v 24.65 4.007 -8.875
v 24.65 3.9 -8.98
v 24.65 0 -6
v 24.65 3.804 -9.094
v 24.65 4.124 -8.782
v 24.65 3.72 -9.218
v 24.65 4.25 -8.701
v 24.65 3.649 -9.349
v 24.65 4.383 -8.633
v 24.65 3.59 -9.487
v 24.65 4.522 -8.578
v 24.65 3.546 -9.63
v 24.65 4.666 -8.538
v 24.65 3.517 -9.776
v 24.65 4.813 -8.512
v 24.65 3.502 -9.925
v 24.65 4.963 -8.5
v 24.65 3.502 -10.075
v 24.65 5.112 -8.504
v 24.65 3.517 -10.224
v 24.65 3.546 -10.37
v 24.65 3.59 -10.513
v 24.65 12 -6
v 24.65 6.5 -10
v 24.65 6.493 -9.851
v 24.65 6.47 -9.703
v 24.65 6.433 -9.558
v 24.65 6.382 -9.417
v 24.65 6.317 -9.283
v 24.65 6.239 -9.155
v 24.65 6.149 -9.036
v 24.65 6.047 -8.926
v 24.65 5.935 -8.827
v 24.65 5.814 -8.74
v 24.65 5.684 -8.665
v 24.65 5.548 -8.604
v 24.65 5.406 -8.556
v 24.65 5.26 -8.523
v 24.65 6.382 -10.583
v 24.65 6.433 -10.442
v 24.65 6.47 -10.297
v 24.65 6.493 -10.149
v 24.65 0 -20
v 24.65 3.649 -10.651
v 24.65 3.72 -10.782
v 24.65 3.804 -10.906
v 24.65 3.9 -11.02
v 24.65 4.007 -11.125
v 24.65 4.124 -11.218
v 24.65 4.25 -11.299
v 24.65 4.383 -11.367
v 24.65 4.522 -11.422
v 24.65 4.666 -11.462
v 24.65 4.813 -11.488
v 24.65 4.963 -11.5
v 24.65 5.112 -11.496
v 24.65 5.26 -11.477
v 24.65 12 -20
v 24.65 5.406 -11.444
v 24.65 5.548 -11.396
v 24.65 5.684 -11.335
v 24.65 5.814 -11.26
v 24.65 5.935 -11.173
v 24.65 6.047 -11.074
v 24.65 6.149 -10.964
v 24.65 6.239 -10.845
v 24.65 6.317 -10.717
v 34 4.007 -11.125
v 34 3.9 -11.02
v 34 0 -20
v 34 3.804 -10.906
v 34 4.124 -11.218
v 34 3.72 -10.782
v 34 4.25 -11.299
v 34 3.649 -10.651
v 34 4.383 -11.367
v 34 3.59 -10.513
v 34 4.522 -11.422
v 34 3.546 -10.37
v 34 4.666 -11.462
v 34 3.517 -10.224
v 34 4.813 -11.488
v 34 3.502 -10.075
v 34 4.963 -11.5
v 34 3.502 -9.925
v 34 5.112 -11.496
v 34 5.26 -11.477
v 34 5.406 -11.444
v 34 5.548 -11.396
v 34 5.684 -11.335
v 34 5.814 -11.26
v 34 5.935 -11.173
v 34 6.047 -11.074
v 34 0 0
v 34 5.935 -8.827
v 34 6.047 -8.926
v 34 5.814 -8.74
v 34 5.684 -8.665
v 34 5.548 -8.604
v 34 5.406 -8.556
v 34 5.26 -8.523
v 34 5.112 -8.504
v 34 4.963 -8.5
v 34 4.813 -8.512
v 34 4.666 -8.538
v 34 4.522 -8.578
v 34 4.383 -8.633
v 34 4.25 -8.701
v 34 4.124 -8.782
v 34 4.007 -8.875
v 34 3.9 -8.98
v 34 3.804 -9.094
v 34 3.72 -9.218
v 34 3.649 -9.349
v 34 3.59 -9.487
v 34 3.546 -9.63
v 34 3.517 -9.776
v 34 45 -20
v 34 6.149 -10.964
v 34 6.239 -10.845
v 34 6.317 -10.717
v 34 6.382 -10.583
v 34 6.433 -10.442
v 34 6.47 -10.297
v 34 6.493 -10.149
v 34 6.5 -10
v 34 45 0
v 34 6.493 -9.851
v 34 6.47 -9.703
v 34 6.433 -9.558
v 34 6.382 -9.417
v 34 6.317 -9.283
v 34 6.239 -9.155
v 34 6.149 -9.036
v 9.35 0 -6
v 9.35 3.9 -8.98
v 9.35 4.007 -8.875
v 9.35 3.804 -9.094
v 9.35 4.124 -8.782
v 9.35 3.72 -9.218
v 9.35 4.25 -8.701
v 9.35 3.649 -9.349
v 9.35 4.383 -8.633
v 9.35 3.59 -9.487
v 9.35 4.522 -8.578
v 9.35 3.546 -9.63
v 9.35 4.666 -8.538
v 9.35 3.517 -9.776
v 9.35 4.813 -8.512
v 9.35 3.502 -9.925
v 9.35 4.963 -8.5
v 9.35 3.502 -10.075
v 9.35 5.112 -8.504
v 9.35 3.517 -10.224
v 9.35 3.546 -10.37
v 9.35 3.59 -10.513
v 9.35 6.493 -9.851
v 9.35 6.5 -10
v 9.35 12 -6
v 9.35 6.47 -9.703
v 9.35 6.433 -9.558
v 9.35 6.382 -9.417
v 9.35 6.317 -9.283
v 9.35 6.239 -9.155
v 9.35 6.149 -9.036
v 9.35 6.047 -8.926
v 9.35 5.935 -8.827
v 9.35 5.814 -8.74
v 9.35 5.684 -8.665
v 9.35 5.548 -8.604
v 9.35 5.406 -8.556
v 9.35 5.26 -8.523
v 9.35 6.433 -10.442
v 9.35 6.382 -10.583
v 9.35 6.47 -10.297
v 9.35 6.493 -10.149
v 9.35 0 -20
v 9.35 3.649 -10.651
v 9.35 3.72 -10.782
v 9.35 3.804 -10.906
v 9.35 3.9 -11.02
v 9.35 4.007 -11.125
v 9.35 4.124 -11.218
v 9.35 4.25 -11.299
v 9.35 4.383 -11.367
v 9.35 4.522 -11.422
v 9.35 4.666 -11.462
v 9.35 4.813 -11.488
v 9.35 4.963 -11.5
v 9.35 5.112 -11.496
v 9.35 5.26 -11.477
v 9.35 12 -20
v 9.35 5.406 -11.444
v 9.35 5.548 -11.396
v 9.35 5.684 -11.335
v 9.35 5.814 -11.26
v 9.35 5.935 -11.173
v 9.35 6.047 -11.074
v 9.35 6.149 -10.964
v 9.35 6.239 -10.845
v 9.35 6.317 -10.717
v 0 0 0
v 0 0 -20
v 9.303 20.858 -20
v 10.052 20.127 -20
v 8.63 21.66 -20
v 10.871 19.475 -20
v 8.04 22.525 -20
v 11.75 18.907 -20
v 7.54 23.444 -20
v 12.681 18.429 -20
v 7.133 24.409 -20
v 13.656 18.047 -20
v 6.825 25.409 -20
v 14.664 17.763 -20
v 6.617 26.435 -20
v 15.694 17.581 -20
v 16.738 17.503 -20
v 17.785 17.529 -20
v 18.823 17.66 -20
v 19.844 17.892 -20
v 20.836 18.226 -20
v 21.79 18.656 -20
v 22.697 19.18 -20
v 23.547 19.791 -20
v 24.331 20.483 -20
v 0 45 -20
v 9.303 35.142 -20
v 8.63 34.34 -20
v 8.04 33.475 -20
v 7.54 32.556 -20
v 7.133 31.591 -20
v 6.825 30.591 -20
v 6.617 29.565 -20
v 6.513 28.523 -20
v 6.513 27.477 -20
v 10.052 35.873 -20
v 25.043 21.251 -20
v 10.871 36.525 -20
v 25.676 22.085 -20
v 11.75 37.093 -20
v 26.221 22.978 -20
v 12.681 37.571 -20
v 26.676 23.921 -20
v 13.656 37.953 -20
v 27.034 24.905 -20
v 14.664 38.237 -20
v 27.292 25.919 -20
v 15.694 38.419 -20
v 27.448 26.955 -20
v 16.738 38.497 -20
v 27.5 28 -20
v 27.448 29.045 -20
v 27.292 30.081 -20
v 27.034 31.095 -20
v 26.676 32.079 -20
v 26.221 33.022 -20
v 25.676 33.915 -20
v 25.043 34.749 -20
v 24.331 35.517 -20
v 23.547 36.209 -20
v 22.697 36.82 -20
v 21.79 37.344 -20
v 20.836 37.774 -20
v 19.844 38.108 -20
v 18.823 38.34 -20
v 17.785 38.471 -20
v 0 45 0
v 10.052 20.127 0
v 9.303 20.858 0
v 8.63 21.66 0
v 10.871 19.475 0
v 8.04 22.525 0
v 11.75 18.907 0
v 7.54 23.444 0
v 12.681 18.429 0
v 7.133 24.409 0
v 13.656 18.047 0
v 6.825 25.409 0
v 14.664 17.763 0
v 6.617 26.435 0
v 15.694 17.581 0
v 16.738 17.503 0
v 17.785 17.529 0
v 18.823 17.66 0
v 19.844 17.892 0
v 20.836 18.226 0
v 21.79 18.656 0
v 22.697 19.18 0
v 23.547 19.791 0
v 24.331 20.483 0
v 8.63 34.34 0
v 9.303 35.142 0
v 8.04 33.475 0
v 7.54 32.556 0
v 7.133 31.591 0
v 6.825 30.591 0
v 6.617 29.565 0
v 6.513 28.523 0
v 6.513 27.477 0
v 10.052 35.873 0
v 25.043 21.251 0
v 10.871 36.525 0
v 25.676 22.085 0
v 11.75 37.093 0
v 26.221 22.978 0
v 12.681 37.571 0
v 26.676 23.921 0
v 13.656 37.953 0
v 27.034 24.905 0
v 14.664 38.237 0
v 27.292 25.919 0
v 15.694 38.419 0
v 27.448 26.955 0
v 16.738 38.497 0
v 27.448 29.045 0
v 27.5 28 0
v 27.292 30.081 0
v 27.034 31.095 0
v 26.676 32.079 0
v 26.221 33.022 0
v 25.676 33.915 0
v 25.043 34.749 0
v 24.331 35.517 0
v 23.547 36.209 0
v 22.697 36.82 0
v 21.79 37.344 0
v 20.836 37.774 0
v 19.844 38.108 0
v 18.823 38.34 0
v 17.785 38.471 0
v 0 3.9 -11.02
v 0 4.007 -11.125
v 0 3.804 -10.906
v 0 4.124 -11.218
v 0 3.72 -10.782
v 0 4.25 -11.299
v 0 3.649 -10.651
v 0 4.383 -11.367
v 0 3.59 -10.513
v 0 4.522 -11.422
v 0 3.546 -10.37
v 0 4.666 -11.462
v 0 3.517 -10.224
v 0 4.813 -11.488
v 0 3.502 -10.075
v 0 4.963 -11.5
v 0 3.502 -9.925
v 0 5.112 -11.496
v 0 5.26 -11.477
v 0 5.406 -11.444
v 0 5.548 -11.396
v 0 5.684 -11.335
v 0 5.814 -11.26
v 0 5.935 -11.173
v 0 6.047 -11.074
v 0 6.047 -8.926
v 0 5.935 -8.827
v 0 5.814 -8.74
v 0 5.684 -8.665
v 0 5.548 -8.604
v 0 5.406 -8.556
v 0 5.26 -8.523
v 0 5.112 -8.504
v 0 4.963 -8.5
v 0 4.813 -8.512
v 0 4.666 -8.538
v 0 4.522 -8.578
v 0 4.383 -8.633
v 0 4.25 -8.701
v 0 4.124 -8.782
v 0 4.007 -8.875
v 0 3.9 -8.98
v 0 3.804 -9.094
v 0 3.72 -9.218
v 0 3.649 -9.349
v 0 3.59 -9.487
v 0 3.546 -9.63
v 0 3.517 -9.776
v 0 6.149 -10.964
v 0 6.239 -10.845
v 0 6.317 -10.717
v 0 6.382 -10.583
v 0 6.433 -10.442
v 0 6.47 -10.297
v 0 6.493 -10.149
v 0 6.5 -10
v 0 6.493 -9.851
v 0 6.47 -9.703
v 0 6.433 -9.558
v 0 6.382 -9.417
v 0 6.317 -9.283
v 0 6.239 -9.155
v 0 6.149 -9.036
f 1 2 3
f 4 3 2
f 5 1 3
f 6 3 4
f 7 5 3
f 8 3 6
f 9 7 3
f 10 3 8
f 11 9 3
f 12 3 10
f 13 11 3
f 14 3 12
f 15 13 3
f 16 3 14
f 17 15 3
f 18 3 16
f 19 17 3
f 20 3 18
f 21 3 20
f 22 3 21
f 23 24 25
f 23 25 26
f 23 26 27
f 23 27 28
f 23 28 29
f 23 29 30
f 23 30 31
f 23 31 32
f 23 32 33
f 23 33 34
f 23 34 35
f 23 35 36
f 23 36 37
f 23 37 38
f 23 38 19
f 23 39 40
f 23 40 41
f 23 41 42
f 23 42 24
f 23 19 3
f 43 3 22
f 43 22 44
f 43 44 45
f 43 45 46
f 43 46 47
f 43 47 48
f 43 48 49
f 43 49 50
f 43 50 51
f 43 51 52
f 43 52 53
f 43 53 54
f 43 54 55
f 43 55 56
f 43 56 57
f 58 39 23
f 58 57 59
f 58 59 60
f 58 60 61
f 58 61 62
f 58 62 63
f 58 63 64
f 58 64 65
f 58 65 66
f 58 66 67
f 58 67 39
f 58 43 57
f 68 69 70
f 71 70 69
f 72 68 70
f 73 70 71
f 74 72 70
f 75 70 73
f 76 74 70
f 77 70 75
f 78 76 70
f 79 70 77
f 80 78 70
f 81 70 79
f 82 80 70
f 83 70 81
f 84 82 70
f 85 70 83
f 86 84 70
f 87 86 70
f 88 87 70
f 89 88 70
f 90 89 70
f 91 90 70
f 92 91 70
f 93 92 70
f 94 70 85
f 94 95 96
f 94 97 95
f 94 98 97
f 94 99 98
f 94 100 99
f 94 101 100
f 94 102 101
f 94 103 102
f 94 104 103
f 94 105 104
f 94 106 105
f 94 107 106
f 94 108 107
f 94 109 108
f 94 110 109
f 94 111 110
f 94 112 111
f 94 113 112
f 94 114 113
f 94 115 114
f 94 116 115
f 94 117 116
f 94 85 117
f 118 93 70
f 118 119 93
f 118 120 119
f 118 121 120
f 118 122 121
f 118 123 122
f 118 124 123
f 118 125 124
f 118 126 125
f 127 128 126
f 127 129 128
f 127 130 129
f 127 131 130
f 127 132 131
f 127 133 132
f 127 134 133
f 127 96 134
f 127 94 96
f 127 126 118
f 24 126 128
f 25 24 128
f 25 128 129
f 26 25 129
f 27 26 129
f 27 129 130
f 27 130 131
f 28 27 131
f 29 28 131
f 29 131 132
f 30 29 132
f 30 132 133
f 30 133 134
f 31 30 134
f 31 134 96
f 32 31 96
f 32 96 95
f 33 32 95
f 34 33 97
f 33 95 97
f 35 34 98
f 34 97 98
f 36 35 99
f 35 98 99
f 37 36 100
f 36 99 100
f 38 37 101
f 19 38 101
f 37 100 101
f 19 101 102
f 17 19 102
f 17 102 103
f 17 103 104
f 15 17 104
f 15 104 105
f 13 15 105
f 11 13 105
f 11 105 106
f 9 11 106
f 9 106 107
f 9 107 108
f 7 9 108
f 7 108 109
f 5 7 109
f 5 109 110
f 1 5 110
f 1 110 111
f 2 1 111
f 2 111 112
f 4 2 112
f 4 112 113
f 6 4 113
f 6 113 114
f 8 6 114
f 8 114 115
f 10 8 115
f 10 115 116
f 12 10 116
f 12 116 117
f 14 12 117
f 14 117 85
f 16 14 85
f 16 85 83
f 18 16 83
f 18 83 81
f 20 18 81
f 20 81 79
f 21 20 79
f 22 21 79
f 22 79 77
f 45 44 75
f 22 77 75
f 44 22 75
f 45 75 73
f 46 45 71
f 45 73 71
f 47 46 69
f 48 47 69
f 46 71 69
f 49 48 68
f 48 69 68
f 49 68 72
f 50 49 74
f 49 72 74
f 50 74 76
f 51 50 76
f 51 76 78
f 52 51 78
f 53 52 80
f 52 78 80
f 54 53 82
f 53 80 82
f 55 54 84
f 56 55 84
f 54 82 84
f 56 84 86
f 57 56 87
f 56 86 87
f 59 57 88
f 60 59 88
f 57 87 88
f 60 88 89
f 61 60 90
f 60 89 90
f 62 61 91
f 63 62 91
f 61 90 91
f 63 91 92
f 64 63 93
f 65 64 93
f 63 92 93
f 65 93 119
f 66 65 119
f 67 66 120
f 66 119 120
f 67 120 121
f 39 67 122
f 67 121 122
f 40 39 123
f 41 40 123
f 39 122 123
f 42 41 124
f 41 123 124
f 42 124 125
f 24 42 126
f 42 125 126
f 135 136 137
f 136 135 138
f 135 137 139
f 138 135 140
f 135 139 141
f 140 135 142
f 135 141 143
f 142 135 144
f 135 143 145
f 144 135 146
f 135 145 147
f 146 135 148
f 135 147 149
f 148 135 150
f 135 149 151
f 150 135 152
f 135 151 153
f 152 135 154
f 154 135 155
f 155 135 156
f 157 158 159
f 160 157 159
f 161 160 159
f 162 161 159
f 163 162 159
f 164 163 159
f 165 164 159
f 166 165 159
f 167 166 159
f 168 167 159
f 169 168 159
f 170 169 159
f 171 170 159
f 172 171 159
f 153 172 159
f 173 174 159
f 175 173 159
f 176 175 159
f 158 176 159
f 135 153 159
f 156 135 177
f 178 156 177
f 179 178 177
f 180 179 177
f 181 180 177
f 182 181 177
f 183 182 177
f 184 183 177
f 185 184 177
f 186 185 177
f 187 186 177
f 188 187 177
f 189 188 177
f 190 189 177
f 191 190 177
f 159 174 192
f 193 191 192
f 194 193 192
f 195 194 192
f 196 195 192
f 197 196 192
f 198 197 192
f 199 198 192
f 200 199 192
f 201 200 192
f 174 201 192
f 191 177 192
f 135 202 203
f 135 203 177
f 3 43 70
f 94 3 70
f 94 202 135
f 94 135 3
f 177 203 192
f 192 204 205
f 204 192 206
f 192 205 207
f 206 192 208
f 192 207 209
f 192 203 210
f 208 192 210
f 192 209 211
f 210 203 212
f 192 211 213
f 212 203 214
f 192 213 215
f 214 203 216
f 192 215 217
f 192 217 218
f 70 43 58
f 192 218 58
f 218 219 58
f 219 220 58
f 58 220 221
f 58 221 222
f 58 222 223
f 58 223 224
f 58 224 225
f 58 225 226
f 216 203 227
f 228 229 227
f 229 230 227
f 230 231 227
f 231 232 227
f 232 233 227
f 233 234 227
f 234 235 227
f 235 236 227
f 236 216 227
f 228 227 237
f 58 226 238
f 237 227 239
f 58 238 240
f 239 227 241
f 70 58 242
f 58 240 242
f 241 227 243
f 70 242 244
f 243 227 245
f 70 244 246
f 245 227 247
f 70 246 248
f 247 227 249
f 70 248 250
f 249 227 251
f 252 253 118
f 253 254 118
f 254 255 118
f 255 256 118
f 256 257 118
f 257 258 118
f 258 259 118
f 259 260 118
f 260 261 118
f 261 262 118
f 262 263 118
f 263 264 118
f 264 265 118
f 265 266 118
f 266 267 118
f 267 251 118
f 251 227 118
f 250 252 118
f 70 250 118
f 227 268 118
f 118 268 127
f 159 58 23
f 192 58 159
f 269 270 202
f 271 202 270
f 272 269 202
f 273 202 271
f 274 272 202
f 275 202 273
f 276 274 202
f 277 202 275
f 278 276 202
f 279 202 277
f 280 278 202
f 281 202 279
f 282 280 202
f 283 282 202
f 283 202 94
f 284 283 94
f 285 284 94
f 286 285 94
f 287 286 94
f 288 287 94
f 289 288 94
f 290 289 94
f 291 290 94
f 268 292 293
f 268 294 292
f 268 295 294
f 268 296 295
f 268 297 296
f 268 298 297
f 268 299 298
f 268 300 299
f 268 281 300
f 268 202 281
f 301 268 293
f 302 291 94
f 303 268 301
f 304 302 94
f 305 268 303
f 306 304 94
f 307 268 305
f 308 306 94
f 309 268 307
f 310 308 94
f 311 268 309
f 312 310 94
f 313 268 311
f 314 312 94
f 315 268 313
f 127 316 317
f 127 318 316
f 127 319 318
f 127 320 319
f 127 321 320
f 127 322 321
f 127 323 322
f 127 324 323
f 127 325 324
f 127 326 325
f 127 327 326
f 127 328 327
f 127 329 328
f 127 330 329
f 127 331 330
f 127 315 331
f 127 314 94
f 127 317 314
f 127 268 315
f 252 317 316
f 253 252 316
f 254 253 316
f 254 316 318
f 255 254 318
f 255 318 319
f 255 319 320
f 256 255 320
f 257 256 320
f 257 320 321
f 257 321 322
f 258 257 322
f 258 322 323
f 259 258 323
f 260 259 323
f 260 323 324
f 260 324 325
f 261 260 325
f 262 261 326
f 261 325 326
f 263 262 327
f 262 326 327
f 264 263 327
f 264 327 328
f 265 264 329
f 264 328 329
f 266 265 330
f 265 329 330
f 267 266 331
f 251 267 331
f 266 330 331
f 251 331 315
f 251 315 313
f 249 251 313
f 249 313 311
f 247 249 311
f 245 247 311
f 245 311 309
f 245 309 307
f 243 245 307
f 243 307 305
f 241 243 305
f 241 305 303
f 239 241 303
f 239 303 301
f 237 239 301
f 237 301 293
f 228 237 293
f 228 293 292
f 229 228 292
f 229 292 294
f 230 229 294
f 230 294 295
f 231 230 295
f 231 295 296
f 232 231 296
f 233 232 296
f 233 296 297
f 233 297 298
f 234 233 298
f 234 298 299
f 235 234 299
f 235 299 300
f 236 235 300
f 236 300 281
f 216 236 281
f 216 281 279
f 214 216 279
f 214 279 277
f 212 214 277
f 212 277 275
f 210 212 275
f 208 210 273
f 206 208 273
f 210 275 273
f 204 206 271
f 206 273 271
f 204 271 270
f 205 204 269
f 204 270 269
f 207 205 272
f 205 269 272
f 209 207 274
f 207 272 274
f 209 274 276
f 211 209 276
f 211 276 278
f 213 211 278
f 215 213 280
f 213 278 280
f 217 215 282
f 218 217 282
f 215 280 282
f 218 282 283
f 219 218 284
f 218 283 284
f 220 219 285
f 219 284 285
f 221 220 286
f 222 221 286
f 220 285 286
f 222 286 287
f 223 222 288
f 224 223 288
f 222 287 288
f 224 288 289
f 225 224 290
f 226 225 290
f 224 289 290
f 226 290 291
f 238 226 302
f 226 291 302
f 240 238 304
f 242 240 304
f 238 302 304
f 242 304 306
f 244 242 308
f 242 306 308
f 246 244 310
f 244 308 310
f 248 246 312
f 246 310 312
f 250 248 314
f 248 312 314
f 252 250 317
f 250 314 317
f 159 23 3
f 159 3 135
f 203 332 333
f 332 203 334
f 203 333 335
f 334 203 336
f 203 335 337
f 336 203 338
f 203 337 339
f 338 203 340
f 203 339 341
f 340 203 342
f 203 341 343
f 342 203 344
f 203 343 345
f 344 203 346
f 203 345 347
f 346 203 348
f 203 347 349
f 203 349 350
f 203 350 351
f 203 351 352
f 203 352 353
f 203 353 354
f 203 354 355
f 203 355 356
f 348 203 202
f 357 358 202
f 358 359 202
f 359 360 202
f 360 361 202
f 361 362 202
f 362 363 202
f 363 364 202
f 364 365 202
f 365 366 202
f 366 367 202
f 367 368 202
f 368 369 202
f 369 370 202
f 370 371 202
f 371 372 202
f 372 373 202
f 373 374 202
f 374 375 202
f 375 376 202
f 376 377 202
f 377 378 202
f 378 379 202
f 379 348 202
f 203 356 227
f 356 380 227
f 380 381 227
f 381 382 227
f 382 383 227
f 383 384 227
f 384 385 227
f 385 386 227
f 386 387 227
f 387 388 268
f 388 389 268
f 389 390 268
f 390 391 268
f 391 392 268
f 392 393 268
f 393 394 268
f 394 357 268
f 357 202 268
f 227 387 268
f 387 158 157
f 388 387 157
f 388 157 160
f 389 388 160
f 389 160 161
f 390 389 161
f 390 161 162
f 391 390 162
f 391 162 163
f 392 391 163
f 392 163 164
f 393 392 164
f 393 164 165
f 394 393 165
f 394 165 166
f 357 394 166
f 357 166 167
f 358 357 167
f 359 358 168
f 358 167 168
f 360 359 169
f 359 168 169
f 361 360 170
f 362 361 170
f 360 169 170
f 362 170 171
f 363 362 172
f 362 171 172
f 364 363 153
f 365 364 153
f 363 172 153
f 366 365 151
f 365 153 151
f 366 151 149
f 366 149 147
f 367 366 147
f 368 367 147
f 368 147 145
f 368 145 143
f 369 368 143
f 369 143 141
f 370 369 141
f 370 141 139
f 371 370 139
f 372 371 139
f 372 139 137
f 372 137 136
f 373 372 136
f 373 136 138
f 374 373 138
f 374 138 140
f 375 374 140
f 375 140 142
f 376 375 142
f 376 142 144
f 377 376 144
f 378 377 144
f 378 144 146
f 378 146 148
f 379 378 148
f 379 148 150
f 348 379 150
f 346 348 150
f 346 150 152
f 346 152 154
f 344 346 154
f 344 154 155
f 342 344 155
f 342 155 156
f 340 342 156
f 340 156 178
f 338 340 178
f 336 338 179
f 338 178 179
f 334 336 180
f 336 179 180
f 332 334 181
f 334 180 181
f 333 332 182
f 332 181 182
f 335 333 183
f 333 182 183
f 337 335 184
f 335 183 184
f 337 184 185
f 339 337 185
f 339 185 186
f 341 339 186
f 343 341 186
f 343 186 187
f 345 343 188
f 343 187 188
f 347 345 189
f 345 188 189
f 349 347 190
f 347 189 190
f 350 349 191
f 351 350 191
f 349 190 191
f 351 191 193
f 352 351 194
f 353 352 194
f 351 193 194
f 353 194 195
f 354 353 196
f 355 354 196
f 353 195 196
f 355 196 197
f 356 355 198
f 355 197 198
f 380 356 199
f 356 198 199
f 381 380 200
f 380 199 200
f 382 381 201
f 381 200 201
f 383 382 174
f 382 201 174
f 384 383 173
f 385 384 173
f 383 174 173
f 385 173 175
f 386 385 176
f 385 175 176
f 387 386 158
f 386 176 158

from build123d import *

# Parameters (mm, degrees)
SKETCH_3_W          = 34
SKETCH_3_H          = 45
EXTRUDE_1_DEPTH     = 20
SKETCH_4_R          = 10.5
CUT_EXTRUDE_1_DEPTH = 60.841457202
SKETCH_7_W          = 15.3
SKETCH_7_H          = 12
CUT_EXTRUDE_2_DEPTH = 14
SKETCH_9_R          = 1.5
CUT_EXTRUDE_3_DEPTH = 60.841457202


with BuildPart() as part:
    # 草图3 → 凸台-拉伸1 (new body)
    with BuildSketch(Plane.XY):
        with Locations((17, 22.5)):
            Rectangle(SKETCH_3_W, SKETCH_3_H)
    extrude(amount=-EXTRUDE_1_DEPTH)

    # 草图4 → 切除-拉伸1 (cut, through all)
    with BuildSketch(Plane.XY):
        with Locations((17, 28)):
            Circle(SKETCH_4_R)
    extrude(amount=-CUT_EXTRUDE_1_DEPTH, mode=Mode.SUBTRACT)

    # 草图7 → 切除-拉伸2 (cut)
    with BuildSketch(Plane(origin=(0, 0, -20), x_dir=(-1, 0, 0), z_dir=(0, 0, -1))):
        with Locations((-17, 6)):
            Rectangle(SKETCH_7_W, SKETCH_7_H)
    extrude(amount=-CUT_EXTRUDE_2_DEPTH, mode=Mode.SUBTRACT)

    # 草图9 → 切除-拉伸3 (cut, through all)
    with BuildSketch(Plane(origin=(34, 0, 0), x_dir=(0, 0, -1), z_dir=(1, 0, 0))):
        with Locations(Location((10, 5, 0), (0, 0, 90))):
            Circle(SKETCH_9_R)
    extrude(amount=-CUT_EXTRUDE_3_DEPTH, mode=Mode.SUBTRACT)


solid = part.part
